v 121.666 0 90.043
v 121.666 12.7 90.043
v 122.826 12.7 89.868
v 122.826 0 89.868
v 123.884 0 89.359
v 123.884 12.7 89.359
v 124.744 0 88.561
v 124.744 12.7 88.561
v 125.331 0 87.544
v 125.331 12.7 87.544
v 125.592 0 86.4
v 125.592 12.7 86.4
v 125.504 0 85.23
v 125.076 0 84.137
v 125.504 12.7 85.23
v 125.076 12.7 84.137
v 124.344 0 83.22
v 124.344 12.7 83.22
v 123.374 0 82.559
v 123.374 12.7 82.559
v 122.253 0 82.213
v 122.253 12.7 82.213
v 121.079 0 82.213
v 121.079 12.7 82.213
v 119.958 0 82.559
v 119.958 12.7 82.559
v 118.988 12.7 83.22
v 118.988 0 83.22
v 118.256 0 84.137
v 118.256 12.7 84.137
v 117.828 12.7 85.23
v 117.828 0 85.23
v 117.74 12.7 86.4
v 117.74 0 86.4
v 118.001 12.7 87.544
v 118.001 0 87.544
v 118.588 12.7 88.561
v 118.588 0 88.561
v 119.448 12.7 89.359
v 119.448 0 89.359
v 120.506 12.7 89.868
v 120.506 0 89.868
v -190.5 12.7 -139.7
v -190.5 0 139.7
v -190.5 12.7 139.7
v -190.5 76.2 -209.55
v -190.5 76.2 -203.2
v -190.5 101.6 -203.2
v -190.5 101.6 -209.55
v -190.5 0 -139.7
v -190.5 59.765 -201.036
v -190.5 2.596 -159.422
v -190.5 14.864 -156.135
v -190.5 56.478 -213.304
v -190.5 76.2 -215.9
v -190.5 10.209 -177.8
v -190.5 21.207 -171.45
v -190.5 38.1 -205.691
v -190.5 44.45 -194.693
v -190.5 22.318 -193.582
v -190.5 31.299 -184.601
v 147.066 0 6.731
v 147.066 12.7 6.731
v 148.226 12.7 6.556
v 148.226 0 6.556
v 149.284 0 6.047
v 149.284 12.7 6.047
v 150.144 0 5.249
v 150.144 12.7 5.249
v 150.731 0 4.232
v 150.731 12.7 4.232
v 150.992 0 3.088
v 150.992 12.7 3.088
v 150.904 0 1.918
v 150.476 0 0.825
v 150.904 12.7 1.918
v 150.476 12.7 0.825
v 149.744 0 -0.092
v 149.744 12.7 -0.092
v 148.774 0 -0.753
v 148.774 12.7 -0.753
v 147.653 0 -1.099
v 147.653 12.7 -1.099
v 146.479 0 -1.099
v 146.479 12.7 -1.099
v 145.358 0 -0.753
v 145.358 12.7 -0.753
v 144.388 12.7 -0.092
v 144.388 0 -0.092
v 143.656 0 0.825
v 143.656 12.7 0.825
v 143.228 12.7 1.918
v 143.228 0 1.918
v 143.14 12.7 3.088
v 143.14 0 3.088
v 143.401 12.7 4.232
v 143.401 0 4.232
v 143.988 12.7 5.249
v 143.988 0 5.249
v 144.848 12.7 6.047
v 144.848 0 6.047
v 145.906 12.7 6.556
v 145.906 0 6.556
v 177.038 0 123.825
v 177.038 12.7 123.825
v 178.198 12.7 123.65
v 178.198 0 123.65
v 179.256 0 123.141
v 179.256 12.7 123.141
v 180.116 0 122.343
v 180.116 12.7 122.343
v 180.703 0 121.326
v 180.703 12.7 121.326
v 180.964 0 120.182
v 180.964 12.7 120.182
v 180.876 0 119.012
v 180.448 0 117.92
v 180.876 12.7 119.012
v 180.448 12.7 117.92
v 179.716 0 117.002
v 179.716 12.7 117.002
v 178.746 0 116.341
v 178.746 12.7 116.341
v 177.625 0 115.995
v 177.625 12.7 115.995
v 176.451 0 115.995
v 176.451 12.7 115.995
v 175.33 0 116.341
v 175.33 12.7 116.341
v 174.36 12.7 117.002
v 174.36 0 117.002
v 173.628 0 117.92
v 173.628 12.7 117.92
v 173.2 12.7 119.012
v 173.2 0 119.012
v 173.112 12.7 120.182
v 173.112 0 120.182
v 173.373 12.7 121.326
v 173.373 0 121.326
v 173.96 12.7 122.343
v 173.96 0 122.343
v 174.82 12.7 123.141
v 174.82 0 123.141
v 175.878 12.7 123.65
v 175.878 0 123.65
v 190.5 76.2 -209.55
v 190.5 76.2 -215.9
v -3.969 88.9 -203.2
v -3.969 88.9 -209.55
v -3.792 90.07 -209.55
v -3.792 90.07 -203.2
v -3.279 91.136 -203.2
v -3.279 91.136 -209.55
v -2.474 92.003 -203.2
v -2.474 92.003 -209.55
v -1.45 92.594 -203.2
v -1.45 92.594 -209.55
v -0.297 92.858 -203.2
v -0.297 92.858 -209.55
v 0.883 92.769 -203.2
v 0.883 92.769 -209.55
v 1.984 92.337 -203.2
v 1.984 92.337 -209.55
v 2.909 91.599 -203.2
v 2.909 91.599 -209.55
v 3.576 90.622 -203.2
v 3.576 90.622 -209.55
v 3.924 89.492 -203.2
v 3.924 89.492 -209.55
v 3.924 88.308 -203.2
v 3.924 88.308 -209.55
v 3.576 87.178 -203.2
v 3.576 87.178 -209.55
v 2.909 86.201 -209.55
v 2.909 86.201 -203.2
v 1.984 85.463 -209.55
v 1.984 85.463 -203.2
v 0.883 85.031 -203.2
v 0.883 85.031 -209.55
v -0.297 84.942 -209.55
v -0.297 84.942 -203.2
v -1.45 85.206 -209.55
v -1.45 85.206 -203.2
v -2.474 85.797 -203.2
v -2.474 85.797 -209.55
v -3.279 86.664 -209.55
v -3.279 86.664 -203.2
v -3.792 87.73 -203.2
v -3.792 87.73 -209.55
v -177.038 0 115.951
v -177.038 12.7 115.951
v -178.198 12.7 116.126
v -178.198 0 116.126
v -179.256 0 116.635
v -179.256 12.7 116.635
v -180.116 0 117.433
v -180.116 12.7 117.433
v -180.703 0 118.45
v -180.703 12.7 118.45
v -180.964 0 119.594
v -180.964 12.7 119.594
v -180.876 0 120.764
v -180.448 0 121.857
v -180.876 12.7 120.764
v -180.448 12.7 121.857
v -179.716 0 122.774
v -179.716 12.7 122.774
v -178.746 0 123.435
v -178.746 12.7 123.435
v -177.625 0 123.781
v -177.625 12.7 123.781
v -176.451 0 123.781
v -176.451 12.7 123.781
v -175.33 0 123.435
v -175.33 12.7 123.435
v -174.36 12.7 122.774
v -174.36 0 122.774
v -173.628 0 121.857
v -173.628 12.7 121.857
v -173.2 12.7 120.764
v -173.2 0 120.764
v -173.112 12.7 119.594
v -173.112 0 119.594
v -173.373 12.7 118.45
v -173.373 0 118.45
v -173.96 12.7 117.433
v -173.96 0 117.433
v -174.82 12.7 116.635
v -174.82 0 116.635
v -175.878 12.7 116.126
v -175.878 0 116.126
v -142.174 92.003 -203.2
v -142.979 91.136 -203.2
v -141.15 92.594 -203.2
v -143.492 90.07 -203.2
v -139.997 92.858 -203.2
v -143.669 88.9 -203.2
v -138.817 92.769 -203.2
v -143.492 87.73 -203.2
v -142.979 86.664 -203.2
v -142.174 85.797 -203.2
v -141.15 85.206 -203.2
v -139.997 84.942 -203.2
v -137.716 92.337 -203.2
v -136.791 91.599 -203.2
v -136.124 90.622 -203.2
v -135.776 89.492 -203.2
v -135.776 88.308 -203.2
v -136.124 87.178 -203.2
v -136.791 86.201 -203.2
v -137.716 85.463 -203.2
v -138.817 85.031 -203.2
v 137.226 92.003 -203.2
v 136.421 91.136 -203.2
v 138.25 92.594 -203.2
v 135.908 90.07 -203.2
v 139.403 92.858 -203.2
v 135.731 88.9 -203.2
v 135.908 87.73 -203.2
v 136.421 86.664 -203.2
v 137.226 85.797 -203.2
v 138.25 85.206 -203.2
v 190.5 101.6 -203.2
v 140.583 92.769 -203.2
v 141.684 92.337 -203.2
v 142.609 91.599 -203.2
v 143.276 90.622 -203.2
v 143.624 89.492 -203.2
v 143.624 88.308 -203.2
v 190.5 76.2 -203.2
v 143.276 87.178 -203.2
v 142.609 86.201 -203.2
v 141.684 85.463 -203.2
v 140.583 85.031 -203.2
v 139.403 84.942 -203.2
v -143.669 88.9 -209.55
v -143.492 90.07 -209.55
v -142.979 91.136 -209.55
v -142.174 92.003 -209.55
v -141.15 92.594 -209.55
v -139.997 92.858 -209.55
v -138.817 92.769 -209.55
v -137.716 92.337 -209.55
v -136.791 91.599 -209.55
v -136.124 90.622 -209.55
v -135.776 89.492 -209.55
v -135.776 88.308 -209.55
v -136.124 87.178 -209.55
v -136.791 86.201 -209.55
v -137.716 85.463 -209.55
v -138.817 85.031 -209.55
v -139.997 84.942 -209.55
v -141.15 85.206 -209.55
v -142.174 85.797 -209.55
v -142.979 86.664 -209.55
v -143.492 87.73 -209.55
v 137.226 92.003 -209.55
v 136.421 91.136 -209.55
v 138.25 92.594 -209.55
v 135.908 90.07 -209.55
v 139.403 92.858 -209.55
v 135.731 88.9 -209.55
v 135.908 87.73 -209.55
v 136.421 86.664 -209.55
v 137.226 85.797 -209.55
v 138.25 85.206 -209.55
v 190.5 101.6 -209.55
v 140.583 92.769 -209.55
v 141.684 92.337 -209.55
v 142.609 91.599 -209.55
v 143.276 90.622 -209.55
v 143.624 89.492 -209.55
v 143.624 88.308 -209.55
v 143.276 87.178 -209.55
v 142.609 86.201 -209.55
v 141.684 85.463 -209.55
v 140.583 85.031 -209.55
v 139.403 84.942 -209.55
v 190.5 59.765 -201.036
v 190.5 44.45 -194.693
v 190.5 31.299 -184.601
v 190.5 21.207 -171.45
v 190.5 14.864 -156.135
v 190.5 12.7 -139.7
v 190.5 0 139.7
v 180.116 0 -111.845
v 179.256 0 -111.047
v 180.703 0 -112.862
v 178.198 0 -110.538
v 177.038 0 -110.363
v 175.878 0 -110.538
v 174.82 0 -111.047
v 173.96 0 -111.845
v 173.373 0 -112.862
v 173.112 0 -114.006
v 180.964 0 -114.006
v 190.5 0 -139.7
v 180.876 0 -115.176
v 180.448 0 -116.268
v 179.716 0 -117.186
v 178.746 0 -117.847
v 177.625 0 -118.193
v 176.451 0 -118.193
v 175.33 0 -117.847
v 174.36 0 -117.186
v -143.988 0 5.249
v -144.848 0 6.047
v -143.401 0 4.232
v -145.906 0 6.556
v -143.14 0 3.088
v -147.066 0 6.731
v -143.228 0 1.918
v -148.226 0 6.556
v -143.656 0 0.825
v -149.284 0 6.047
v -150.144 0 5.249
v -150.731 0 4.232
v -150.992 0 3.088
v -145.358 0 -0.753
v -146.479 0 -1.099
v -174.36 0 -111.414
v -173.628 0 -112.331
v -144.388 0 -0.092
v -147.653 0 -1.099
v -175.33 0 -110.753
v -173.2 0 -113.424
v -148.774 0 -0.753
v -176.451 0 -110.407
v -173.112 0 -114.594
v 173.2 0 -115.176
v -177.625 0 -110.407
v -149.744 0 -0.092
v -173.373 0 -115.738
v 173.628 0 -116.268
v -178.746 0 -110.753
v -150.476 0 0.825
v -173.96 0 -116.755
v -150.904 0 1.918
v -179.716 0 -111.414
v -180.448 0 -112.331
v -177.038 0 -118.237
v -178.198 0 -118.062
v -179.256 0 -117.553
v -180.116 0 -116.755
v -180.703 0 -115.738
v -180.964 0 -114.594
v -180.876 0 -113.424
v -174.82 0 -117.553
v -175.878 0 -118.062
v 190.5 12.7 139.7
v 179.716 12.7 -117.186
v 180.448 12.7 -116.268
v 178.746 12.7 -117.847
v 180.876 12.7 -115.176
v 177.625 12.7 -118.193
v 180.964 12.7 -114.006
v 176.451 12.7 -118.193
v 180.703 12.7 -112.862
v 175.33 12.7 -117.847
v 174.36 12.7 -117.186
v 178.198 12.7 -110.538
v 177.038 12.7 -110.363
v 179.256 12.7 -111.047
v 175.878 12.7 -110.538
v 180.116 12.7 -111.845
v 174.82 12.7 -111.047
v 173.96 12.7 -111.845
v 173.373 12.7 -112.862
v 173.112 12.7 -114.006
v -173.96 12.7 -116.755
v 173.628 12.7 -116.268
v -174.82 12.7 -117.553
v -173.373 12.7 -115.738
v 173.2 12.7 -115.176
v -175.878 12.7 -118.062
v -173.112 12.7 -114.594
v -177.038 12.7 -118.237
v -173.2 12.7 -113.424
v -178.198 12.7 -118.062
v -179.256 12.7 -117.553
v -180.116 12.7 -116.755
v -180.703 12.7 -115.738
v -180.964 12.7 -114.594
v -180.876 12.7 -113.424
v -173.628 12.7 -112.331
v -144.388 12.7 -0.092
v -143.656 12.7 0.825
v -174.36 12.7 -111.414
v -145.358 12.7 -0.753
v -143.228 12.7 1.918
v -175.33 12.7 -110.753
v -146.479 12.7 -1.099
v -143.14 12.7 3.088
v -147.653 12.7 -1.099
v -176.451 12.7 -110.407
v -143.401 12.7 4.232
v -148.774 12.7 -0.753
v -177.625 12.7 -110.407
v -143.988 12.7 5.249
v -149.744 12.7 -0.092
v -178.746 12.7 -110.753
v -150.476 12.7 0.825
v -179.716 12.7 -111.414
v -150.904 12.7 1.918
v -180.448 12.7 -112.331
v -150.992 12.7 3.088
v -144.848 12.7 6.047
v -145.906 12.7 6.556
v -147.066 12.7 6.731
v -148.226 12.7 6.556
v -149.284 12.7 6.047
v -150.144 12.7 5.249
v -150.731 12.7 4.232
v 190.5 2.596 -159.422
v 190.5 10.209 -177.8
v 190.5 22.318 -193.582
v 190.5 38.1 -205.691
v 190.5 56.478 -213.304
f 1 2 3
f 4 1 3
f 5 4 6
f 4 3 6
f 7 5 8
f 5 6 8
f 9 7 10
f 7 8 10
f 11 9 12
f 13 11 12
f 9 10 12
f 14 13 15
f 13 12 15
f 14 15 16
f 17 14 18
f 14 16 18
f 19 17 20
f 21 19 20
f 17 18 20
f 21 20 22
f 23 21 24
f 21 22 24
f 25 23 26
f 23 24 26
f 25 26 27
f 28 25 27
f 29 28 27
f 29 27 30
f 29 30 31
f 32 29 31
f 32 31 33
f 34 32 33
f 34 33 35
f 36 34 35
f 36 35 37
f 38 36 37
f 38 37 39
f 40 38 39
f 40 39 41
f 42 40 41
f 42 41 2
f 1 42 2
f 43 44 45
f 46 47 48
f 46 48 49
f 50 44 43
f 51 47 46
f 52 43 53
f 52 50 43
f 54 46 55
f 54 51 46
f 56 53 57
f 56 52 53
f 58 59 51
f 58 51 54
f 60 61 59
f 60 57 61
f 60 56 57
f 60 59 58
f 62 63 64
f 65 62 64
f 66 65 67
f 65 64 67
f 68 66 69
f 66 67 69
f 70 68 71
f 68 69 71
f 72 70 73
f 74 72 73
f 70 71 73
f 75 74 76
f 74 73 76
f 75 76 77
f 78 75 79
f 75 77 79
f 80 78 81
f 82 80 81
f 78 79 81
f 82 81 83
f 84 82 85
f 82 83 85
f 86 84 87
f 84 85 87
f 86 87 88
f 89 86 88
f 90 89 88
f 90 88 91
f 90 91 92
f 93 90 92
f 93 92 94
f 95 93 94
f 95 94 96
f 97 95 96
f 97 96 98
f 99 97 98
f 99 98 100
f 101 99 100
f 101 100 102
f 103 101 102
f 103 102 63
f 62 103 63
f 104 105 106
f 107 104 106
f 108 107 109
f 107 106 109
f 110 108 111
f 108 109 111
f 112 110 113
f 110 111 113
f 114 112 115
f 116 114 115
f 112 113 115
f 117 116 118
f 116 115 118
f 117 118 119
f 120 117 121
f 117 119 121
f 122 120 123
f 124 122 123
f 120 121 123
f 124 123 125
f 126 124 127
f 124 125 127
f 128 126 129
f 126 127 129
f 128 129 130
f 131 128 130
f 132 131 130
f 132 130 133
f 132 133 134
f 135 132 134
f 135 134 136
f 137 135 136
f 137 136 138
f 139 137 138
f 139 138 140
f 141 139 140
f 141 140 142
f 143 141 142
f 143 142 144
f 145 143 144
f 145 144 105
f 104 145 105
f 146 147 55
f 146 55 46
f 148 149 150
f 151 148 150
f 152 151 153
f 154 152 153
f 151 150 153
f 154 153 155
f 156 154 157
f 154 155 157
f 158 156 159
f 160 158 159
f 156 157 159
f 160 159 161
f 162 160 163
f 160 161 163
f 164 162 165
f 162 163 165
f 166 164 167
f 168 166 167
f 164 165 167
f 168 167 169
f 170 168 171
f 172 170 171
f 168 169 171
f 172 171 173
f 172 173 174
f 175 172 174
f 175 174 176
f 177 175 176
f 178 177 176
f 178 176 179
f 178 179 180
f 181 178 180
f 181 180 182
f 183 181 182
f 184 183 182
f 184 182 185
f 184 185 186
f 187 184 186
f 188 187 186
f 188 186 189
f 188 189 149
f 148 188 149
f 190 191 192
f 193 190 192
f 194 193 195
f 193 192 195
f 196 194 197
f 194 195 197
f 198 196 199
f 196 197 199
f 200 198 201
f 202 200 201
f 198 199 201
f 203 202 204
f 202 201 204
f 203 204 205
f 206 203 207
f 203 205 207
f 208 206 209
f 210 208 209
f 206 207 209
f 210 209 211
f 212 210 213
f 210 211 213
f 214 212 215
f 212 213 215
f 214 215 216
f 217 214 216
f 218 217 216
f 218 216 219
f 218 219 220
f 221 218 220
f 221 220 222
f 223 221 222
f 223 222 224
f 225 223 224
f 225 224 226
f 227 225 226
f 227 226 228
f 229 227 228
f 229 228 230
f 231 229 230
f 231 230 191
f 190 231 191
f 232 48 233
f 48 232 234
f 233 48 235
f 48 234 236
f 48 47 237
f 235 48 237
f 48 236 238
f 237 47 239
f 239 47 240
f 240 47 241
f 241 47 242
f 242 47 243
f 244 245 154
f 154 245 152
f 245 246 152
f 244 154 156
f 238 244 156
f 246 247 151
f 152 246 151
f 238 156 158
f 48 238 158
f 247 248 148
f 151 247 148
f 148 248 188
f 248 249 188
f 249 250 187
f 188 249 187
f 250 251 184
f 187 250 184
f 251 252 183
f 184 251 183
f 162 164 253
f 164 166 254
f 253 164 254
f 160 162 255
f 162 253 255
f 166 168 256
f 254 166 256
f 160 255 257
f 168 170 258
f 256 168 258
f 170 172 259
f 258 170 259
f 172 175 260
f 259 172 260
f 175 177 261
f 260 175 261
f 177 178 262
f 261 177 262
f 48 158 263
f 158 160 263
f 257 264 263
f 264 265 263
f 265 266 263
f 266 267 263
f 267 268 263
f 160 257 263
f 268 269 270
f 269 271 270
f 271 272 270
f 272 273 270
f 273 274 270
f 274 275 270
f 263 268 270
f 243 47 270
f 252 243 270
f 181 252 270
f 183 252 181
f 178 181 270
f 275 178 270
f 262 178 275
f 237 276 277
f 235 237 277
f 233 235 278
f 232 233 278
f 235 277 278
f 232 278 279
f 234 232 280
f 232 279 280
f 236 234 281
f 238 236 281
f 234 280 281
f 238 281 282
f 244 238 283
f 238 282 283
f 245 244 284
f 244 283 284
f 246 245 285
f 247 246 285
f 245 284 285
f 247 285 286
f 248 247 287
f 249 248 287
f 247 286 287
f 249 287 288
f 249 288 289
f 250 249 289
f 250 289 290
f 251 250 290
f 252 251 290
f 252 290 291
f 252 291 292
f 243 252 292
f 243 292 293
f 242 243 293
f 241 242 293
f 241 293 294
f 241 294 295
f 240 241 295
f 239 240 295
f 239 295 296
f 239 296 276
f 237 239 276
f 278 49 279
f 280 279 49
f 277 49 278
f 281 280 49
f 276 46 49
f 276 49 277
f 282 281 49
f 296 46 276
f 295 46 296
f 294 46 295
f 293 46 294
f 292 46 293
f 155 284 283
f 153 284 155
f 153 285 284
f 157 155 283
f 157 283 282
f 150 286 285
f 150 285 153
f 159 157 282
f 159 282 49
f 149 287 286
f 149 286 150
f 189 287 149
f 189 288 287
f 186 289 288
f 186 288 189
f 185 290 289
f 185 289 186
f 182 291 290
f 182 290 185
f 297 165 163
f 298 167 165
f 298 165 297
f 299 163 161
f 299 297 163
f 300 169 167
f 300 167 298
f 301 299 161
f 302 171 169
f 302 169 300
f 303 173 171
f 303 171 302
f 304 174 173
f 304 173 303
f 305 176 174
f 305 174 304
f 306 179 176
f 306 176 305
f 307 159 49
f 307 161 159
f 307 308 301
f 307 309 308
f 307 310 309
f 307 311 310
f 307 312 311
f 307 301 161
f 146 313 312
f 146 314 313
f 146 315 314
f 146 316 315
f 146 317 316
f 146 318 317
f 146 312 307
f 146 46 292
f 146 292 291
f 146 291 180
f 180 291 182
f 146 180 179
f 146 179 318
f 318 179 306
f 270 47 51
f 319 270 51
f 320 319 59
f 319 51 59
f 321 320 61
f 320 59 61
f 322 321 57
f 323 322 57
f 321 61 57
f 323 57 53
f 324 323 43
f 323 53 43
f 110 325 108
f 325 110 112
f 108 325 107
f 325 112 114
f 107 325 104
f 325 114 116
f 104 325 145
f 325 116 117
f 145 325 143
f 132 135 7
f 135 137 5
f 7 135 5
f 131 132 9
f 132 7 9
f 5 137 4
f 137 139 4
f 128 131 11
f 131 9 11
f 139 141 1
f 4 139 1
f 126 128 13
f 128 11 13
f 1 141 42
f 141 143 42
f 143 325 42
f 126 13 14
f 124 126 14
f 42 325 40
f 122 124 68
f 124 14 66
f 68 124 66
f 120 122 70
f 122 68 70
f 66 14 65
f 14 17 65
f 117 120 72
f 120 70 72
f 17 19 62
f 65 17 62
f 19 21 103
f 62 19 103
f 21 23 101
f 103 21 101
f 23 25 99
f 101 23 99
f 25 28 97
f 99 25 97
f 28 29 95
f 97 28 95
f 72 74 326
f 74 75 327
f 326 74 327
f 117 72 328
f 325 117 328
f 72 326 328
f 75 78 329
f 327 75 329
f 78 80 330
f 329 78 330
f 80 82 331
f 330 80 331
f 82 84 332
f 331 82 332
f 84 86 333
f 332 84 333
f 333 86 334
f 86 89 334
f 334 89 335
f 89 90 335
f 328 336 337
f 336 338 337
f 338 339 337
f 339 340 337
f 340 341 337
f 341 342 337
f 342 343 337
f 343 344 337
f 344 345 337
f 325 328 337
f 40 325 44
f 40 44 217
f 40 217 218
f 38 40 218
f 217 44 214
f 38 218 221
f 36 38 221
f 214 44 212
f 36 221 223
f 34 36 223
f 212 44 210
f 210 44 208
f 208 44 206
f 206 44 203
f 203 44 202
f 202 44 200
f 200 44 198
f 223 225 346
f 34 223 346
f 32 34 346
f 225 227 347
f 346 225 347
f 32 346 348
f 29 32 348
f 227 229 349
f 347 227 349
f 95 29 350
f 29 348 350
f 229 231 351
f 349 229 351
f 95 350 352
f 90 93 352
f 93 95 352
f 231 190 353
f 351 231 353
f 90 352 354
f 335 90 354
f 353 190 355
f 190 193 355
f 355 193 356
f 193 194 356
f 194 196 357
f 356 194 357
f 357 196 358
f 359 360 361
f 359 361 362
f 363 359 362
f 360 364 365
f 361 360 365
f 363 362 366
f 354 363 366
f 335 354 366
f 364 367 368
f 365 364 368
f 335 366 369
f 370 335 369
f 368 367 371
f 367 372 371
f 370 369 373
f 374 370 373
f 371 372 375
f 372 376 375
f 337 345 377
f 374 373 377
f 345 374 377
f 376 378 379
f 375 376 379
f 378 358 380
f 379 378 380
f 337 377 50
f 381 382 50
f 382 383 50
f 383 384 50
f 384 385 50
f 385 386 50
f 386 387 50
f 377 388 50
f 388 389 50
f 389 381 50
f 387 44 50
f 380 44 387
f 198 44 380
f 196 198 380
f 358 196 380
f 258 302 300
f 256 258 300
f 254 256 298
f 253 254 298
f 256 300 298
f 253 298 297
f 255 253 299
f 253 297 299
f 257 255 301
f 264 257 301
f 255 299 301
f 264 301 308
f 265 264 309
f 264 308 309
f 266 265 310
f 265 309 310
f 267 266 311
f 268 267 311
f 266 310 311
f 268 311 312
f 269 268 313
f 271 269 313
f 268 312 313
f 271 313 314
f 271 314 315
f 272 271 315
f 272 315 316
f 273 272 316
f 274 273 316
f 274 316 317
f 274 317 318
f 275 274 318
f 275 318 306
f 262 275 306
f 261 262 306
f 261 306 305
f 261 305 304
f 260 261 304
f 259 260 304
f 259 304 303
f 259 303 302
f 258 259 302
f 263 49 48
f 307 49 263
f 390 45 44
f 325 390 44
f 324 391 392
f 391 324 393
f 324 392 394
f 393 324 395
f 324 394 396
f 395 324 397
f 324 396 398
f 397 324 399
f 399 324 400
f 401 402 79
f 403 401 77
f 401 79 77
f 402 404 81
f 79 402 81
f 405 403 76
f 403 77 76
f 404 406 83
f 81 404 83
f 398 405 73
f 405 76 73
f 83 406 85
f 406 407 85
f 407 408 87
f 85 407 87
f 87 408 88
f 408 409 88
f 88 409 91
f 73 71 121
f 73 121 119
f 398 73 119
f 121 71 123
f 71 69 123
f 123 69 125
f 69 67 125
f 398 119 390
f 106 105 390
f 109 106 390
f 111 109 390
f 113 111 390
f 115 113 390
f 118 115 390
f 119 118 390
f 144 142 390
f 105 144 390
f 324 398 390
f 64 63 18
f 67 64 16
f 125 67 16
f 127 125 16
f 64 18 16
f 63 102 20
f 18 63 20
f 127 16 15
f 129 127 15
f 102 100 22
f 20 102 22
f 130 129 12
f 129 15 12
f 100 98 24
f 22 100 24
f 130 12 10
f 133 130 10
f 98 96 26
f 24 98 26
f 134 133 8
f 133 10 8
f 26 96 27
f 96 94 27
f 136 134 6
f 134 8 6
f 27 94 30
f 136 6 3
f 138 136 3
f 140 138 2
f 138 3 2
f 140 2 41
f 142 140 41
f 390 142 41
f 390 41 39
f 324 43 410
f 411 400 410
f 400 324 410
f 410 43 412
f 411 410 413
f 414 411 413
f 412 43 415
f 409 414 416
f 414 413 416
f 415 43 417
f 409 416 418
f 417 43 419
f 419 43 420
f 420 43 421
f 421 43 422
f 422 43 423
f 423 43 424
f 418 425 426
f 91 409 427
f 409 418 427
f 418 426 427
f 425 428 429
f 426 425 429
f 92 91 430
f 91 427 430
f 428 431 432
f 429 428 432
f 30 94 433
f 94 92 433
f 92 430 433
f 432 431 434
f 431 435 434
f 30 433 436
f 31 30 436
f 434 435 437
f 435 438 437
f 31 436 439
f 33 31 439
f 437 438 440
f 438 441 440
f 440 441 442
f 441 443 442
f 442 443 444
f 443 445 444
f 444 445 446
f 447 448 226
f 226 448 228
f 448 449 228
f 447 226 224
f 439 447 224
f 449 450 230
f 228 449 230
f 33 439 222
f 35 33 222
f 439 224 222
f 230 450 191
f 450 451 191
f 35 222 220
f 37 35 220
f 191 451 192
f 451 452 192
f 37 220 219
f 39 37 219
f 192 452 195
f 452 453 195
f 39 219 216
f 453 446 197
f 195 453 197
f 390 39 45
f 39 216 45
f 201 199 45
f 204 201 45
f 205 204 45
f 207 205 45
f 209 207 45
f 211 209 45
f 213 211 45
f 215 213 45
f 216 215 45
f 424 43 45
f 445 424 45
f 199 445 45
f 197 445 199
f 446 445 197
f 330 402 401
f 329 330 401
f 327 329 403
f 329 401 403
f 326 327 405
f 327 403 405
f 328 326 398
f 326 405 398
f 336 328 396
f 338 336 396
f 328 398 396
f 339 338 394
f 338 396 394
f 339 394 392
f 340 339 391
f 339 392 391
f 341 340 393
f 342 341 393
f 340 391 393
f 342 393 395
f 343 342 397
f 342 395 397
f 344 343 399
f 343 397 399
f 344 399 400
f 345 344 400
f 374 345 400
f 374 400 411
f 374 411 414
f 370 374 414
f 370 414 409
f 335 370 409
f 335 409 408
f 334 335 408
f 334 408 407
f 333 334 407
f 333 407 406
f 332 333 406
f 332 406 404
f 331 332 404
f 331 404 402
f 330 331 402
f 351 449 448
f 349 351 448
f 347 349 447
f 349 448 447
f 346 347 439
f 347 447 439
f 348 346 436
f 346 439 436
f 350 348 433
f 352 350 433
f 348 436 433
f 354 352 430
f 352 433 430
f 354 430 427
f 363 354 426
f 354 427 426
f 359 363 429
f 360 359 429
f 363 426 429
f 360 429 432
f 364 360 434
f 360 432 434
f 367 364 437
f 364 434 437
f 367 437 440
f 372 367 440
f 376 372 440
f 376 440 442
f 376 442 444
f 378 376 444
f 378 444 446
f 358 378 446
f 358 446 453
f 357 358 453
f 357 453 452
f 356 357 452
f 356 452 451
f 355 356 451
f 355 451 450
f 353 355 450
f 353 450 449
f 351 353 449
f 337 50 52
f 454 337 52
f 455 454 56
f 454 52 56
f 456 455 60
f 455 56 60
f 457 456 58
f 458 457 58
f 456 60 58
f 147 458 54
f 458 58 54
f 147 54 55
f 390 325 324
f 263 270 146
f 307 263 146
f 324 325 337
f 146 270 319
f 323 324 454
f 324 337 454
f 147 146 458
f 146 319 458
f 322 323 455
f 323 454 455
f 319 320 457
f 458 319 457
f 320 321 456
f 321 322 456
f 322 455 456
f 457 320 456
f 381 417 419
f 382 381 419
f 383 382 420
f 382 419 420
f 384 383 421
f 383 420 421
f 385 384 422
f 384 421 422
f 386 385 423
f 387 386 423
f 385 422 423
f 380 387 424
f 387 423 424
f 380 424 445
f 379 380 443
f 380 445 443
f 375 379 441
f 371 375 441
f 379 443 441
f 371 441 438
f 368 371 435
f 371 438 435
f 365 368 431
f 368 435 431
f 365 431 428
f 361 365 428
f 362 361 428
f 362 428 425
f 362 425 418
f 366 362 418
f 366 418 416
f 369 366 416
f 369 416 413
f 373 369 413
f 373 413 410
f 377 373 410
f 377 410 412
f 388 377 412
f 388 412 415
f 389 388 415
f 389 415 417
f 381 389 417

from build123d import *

# Parameters (mm, degrees)
BOSS_EXTRUDE1_DEPTH      = 190.5
BOSS_EXTRUDE1_DEPTH_BACK = 190.5
SKETCH2_W                = 381
SKETCH2_H                = 6.35
BOSS_EXTRUDE2_DEPTH      = 25.4
SKETCH3_R                = 3.96875
CUT_EXTRUDE1_DEPTH       = 25.4
SKETCH4_R                = 3.937
CUT_EXTRUDE2_DEPTH       = 302.34078715


with BuildPart() as part:
    # Sketch1 → Boss-Extrude1 (new, two sides: drawn at the far end of the back side and taken through both)
    with BuildSketch(Plane(origin=(0, 0, 0), x_dir=(0, 0, -1), z_dir=(1, 0, 0)).offset(-BOSS_EXTRUDE1_DEPTH_BACK)):
        with BuildLine():
            Line((-139.7, 0), (139.7, 0))
            ThreePointArc((139.7, 0), (193.581536726, 22.318463274), (215.9, 76.2))
            Line((215.9, 76.2), (203.2, 76.2))
            ThreePointArc((203.2, 76.2), (184.601280605, 31.298719395), (139.7, 12.7))
            Line((139.7, 12.7), (-139.7, 12.7))
            Line((-139.7, 12.7), (-139.7, 0))
        make_face()
    extrude(amount=BOSS_EXTRUDE1_DEPTH + BOSS_EXTRUDE1_DEPTH_BACK)

    # Sketch2 → Boss-Extrude2 (add)
    with BuildSketch(Plane(origin=(0, 76.2, 0), x_dir=(1, 0, 0), z_dir=(0, 1, 0))):
        with Locations((0, 206.375)):
            Rectangle(SKETCH2_W, SKETCH2_H)
    extrude(amount=BOSS_EXTRUDE2_DEPTH)

    # Sketch3 → Cut-Extrude1 (cut)
    with BuildSketch(Plane(origin=(0, 0, -209.55), x_dir=(-1, 0, 0), z_dir=(0, 0, -1))):
        with Locations((-139.7, 88.9)):
            Circle(SKETCH3_R)
        with Locations((139.7, 88.9)):
            Circle(SKETCH3_R)
        with Locations((0, 88.9)):
            Circle(SKETCH3_R)
    extrude(amount=-CUT_EXTRUDE1_DEPTH, mode=Mode.SUBTRACT)

    # Sketch4 → Cut-Extrude2 (cut, through all)
    with BuildSketch(Plane(origin=(0, 12.7, 0), x_dir=(1, 0, 0), z_dir=(0, 1, 0))):
        with Locations((177.038, -119.888)):
            Circle(SKETCH4_R)
        with Locations((177.038, 114.3)):
            Circle(SKETCH4_R)
        with Locations((-177.038, -119.888)):
            Circle(SKETCH4_R)
        with Locations((-177.038, 114.3)):
            Circle(SKETCH4_R)
        with Locations((147.066, -2.794)):
            Circle(SKETCH4_R)
        with Locations((-147.066, -2.794)):
            Circle(SKETCH4_R)
        with Locations((121.666, -86.106)):
            Circle(SKETCH4_R)
    extrude(amount=-CUT_EXTRUDE2_DEPTH, mode=Mode.SUBTRACT)


solid = part.part
